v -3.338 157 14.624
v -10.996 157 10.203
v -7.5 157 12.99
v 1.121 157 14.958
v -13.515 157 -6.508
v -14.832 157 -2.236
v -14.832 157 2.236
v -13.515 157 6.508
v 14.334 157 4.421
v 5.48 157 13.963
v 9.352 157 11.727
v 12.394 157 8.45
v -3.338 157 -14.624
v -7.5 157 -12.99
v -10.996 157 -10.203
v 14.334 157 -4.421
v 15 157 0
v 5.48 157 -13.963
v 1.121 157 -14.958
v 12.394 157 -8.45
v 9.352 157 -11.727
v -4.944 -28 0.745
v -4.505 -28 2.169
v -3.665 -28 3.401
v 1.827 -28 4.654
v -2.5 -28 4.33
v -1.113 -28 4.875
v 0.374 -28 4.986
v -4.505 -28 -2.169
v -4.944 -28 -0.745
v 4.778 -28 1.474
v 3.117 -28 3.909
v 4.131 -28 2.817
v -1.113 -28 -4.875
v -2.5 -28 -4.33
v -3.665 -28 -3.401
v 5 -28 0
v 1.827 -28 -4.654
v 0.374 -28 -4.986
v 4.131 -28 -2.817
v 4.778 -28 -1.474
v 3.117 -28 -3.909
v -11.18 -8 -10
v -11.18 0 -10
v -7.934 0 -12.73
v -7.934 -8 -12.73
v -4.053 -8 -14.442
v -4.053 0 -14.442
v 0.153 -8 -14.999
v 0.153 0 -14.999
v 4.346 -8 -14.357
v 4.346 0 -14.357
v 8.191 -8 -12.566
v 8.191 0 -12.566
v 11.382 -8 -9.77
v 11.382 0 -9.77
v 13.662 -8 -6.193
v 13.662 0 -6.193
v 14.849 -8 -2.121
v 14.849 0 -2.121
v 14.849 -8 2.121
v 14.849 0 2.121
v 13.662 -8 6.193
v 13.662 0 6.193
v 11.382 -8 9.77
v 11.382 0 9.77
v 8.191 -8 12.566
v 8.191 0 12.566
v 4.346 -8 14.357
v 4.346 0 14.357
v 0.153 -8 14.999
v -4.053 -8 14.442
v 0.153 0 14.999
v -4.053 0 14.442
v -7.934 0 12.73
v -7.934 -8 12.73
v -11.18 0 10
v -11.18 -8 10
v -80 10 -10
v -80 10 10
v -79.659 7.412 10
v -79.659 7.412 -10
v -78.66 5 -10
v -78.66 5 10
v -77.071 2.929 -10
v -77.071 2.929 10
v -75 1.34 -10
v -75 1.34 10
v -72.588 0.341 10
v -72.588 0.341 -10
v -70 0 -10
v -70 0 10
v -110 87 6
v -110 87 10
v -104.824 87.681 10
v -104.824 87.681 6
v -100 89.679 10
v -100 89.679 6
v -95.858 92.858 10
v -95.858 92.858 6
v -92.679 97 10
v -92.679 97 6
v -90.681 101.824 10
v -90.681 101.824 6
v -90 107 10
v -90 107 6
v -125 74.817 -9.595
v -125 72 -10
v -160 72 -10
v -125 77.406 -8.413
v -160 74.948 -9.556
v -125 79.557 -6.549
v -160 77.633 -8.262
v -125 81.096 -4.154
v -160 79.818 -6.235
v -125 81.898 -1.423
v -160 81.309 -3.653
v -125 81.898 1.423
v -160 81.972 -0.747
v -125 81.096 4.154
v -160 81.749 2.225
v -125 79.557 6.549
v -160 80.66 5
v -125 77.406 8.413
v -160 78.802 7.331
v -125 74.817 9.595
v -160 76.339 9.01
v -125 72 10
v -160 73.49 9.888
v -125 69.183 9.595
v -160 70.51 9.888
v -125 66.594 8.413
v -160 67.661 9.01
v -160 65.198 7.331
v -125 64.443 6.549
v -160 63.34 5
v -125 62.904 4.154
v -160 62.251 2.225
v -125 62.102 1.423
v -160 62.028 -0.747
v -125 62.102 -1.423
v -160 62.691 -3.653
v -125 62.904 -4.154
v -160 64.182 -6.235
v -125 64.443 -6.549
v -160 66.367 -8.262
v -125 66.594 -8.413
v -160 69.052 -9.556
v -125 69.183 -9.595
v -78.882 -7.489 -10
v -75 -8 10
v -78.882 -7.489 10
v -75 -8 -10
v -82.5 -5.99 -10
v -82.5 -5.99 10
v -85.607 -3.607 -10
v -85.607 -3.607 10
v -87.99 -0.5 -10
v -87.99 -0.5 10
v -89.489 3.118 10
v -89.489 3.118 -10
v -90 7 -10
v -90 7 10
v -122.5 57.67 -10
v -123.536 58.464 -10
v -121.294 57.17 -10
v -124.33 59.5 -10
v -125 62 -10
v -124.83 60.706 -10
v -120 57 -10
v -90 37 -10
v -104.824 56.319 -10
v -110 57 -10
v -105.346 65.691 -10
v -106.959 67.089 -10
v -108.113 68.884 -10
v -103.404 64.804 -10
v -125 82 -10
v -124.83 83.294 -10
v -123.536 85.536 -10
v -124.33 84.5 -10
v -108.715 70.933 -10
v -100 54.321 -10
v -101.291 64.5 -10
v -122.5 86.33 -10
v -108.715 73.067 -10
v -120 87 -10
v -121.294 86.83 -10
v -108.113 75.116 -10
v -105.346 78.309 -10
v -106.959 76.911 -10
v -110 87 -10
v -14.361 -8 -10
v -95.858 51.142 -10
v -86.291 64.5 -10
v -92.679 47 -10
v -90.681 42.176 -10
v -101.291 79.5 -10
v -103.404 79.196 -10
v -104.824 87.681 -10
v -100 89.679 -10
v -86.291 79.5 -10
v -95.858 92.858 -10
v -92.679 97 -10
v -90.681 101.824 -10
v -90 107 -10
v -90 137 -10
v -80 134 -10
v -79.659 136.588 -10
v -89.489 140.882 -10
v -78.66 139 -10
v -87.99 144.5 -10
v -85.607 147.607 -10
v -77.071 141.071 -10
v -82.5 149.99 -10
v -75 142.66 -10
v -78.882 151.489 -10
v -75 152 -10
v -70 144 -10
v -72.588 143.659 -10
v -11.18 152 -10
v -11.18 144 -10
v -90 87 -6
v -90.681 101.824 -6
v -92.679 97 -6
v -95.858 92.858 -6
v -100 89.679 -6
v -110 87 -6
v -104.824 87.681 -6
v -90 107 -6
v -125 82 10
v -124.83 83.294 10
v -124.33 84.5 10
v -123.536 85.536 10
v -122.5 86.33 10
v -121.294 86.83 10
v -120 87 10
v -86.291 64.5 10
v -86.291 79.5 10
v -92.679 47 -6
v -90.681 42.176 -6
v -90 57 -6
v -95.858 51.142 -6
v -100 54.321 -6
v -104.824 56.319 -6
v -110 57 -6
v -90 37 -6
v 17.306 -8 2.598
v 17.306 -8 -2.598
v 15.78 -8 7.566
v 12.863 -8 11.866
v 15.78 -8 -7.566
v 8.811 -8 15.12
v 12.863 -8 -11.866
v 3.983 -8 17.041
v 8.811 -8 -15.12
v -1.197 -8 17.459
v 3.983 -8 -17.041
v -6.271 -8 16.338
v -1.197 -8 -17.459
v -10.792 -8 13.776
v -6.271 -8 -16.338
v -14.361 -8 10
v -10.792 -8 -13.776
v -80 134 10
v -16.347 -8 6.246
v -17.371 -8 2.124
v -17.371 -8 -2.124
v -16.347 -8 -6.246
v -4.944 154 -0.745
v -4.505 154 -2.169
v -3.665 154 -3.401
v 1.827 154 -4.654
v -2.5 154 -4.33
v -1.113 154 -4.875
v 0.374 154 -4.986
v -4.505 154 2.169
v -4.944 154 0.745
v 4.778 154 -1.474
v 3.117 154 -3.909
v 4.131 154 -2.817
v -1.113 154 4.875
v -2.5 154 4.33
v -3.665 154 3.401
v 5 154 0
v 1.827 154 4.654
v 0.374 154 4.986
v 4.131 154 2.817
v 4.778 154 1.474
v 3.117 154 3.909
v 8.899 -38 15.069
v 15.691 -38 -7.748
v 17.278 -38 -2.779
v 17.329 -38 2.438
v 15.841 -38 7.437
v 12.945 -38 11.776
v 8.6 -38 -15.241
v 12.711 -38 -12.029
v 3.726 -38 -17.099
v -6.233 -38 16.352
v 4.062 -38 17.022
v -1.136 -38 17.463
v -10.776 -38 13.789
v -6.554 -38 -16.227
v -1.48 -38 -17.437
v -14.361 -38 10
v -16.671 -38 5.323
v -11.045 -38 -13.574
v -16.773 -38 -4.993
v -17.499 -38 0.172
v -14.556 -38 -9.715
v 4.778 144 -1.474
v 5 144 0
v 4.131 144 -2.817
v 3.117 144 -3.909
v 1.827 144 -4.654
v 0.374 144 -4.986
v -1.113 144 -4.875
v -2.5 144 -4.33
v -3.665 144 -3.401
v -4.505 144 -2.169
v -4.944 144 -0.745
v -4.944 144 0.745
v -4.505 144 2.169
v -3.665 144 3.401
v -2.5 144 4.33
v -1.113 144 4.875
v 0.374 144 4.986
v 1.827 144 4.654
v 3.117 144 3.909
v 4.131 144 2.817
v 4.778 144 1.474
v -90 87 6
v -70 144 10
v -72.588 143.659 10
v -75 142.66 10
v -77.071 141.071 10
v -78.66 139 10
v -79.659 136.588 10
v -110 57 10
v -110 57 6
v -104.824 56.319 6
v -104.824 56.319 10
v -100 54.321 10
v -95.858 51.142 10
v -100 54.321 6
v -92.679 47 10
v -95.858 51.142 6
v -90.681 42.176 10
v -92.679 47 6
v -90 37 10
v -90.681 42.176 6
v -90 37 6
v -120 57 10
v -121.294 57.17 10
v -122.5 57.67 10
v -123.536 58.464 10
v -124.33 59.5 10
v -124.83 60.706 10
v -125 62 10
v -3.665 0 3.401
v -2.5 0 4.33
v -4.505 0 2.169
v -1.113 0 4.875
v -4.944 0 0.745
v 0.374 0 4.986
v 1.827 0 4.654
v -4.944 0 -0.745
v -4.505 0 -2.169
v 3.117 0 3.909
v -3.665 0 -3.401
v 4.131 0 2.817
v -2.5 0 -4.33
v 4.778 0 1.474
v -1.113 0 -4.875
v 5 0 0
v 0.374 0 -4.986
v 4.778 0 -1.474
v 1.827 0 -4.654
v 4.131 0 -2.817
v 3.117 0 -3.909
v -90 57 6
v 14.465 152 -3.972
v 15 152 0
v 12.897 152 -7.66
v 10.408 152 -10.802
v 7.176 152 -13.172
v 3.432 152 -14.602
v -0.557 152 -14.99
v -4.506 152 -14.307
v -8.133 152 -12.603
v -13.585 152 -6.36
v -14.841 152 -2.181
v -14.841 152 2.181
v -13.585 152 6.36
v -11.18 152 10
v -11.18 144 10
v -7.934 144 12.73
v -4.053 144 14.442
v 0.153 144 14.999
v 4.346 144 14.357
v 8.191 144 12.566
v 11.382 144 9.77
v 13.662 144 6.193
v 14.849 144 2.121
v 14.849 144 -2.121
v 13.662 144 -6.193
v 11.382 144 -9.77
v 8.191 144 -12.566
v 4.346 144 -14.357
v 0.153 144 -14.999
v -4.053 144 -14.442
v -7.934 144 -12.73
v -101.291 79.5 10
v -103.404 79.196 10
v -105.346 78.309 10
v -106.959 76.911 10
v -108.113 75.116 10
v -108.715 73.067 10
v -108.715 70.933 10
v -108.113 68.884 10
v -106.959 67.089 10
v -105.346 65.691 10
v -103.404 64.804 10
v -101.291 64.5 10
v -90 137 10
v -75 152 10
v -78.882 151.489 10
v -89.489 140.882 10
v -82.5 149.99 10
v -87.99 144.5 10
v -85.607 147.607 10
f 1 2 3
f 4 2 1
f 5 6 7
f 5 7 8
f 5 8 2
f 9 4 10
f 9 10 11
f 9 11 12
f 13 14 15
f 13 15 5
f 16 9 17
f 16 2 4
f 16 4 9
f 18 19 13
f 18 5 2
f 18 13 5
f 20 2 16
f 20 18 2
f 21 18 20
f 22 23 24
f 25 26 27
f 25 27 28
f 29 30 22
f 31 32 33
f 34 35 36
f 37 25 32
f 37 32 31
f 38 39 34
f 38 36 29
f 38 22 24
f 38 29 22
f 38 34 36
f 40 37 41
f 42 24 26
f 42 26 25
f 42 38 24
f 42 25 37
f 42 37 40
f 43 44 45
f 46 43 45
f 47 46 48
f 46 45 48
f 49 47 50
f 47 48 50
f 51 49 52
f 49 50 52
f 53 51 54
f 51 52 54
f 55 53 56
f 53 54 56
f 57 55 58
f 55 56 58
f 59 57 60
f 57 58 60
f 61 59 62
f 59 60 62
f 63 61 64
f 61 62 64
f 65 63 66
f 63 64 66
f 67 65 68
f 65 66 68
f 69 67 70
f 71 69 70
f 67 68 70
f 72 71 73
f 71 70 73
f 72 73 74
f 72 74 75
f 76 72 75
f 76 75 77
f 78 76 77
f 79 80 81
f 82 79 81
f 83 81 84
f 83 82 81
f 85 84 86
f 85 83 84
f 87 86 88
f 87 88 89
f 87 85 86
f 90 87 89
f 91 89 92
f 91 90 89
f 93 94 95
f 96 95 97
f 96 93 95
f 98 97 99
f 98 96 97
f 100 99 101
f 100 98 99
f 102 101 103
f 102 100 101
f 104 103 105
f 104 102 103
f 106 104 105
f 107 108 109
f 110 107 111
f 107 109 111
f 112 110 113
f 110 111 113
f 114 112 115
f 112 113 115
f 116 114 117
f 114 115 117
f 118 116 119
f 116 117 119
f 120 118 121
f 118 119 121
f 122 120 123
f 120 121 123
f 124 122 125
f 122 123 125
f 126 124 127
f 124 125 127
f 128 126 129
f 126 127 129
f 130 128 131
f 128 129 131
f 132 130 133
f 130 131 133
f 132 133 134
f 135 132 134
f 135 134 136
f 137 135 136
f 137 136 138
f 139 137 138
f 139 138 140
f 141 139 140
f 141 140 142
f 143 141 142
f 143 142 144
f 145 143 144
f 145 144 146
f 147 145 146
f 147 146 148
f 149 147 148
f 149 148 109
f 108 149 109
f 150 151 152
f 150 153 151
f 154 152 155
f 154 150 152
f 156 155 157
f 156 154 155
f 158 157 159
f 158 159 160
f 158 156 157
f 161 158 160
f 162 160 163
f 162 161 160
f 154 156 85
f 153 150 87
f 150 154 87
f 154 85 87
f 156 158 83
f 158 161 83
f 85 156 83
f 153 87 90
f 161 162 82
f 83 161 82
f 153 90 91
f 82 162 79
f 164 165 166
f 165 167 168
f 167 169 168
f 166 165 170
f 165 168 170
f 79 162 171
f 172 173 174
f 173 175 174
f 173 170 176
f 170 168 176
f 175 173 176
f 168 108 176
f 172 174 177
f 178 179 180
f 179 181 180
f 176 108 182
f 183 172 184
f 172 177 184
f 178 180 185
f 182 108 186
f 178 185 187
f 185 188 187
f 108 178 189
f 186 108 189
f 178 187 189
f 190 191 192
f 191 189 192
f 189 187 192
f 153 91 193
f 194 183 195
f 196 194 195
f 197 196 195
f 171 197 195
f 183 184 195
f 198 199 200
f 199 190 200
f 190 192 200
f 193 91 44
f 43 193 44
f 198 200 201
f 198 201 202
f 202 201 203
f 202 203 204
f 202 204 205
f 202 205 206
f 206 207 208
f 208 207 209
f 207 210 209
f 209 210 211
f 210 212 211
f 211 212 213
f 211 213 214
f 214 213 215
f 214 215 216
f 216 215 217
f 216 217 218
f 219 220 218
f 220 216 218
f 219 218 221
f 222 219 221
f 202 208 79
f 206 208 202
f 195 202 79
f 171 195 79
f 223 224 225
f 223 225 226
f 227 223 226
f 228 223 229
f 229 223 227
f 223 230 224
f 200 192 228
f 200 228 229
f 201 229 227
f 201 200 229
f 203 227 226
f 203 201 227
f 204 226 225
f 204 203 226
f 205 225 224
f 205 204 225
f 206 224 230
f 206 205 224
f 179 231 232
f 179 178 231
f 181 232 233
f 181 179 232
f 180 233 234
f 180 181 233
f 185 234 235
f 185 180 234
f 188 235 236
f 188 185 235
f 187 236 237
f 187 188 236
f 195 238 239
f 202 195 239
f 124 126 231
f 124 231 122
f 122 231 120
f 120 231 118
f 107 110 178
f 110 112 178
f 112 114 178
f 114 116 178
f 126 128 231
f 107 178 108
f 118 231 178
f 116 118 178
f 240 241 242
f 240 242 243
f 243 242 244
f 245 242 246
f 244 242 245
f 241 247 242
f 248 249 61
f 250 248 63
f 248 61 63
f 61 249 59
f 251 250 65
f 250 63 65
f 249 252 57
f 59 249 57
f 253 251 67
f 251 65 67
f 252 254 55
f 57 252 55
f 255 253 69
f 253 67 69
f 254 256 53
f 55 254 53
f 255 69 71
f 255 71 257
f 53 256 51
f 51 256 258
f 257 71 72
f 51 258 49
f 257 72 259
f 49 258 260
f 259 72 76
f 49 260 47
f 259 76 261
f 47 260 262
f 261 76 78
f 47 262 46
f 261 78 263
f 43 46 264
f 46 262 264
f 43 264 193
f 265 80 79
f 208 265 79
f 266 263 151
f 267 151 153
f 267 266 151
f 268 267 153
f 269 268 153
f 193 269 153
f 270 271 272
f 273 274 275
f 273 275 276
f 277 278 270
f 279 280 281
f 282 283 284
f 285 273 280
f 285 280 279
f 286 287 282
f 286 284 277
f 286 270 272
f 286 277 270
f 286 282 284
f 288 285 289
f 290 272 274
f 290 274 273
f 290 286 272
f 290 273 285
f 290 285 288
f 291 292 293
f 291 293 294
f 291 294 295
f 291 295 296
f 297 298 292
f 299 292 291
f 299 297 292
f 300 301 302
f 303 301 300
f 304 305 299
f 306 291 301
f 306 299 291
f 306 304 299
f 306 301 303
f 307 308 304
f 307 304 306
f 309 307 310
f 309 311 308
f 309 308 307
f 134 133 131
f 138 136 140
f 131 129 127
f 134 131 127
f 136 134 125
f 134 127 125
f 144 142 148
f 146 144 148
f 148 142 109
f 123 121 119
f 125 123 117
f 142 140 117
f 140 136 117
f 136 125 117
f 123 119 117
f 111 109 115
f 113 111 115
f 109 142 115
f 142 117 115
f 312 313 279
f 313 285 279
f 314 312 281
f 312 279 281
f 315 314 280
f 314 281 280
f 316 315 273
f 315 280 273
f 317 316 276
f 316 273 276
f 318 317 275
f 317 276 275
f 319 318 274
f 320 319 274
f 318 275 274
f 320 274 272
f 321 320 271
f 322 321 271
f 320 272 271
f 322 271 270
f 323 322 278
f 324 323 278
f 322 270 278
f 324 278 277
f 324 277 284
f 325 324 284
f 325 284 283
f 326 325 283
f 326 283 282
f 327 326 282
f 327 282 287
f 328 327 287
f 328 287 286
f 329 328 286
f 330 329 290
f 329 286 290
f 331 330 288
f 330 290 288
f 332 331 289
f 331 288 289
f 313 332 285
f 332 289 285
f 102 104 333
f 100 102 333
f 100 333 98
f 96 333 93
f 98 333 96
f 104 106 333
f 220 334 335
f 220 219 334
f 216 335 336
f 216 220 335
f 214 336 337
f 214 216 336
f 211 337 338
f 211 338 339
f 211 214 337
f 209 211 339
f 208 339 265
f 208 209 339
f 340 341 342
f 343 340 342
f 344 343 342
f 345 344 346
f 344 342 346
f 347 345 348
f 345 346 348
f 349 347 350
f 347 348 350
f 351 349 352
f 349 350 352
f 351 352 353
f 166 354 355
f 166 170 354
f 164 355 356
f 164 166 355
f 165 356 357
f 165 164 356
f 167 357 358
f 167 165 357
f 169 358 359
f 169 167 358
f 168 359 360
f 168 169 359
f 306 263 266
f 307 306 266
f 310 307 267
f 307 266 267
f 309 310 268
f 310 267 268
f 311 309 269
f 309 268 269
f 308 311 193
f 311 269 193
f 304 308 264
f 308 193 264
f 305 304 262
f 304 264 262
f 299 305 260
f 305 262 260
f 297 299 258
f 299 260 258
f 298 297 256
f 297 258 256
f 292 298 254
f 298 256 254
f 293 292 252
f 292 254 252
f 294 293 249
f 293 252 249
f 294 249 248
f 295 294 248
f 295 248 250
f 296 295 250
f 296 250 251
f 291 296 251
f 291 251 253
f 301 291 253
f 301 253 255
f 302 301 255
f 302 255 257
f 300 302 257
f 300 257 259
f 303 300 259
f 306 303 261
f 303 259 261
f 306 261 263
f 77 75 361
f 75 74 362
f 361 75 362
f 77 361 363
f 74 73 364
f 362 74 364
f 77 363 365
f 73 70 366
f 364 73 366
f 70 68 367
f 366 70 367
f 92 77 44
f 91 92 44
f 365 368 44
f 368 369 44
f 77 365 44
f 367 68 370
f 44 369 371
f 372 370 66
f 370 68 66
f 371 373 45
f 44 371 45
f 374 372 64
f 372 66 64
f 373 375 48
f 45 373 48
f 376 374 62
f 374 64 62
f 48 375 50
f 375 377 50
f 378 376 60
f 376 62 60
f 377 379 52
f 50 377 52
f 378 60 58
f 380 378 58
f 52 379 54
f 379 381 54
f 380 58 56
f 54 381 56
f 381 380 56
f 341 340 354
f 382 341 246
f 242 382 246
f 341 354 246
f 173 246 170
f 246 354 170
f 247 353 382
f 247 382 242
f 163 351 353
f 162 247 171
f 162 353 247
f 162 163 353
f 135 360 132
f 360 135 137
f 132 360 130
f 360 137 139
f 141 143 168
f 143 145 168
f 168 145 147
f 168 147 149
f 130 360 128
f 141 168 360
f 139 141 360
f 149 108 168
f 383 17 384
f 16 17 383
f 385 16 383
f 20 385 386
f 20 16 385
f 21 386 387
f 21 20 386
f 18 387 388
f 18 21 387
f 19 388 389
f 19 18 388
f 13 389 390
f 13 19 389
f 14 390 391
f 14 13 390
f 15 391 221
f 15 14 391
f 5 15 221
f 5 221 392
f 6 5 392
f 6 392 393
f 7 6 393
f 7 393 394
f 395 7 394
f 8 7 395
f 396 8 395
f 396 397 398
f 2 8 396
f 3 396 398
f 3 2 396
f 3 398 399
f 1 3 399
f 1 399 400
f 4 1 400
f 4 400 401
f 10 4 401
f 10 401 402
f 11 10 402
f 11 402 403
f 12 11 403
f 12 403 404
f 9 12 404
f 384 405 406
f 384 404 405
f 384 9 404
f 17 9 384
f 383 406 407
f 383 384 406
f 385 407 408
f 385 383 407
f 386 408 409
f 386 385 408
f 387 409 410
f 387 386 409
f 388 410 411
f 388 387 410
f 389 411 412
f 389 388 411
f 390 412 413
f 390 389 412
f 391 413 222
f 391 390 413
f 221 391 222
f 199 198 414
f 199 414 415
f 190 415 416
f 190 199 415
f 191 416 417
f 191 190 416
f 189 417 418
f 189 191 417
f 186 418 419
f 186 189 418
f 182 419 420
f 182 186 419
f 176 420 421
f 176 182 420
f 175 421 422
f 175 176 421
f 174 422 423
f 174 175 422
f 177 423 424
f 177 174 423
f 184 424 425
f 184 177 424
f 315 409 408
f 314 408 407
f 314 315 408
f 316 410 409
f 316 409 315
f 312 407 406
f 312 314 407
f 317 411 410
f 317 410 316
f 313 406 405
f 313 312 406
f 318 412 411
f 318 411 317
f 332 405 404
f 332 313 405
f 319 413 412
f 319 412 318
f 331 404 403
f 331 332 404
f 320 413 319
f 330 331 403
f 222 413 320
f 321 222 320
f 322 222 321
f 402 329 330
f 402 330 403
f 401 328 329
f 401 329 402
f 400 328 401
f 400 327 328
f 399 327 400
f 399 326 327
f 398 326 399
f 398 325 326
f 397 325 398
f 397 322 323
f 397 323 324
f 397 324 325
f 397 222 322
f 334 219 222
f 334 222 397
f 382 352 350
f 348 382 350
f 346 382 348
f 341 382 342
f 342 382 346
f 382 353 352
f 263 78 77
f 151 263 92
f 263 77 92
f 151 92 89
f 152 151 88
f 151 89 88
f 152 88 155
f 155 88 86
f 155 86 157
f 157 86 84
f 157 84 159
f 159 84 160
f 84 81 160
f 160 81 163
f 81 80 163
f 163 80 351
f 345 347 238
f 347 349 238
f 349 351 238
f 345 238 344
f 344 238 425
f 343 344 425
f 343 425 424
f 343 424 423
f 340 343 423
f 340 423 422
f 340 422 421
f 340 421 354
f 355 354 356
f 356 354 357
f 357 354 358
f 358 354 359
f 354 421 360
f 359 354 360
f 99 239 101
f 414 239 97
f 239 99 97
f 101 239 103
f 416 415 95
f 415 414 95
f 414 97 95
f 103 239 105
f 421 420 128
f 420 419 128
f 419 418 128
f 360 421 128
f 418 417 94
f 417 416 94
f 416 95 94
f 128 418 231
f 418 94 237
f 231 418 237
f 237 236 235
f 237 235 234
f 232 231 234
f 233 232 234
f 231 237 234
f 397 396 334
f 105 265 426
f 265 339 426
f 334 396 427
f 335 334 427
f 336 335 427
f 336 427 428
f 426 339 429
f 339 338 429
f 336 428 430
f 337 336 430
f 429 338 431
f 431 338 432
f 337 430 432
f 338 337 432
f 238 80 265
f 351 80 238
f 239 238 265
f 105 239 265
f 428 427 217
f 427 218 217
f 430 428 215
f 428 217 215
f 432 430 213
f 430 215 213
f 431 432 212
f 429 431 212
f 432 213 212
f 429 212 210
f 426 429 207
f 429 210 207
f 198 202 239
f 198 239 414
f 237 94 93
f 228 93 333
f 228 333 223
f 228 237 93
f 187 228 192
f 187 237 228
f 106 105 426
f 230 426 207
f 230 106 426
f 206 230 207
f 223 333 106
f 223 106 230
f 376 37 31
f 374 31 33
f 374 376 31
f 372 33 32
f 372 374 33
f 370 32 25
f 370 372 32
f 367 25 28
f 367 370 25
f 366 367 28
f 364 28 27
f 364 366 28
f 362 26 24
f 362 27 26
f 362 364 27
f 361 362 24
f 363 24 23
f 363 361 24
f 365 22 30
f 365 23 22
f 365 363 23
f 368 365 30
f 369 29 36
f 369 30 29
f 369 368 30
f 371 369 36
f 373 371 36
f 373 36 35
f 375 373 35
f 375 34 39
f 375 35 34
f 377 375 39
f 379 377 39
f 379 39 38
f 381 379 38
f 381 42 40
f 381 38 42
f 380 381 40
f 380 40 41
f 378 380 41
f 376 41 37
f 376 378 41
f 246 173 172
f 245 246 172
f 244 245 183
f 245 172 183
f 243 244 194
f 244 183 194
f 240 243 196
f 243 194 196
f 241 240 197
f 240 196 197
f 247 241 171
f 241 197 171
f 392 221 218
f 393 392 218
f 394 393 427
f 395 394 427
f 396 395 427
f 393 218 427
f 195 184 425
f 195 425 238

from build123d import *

# Parameters (mm, degrees)
SKETCH1_R                = 10
BOSS_EXTRUDE1_DEPTH      = 35
SKETCH2_W                = 20
SKETCH2_H                = 30
BOSS_EXTRUDE2_DEPTH      = 35
BOSS_EXTRUDE3_DEPTH      = 80
BOSS_EXTRUDE3_DEPTH_BACK = 80
SKETCH3_W                = 20
SKETCH3_H                = 10
SKETCH4_W                = 20
SKETCH4_H                = 8
BOSS_EXTRUDE4_DEPTH      = 65
SKETCH5_R                = 5
BOSS_EXTRUDE6_DEPTH      = 8
BOSS_EXTRUDE7_START      = -8
SKETCH6_R                = 5
BOSS_EXTRUDE7_DEPTH      = 8
FILLET1_R                = 15
FILLET2_R                = 10
FILLET3_R                = 10
FILLET4_R                = 15
FILLET5_R                = 20
FILLET6_R                = 20
SKETCH7_W                = 12
SKETCH7_H                = 20
CUT_EXTRUDE1_DEPTH       = 30
SKETCH8_R                = 17.5
BOSS_EXTRUDE8_DEPTH      = 30
SKETCH9_R                = 5
CUT_EXTRUDE2_DEPTH       = 20
BOSS_EXTRUDE9_START      = 5
SKETCH10_R               = 15
BOSS_EXTRUDE9_DEPTH      = 5
CUT_EXTRUDE4_START       = -2
SKETCH11_R               = 5
CUT_EXTRUDE4_DEPTH       = 2
CUT_EXTRUDE5_DEPTH       = 211.624072698
FILLET9_R                = 5
BODY_MOVE_COPY1_ANGLE    = 90


with BuildPart() as part:
    # Sketch1 → Boss-Extrude1 (new body)
    with BuildSketch(Plane.XY):
        Circle(SKETCH1_R)
    extrude(amount=BOSS_EXTRUDE1_DEPTH)

    # Sketch2 → Boss-Extrude2 (add)
    with BuildSketch(Plane.XY.offset(35)):
        Rectangle(SKETCH2_W, SKETCH2_H)
    extrude(amount=BOSS_EXTRUDE2_DEPTH)

    # Sketch3 → Boss-Extrude3 (add, two sides: drawn at the far end of the back side and taken through both)
    with BuildSketch(Plane(origin=(0, 0, 0), x_dir=(1, 0, 0), z_dir=(0, 1, 0)).offset(-BOSS_EXTRUDE3_DEPTH_BACK)):
        with Locations((0, -75)):
            Rectangle(SKETCH3_W, SKETCH3_H)
    extrude(amount=BOSS_EXTRUDE3_DEPTH + BOSS_EXTRUDE3_DEPTH_BACK)

    # Sketch4 → Boss-Extrude4 (add)
    with BuildSketch(Plane.XY.offset(80)):
        with Locations((0, 76)):
            Rectangle(SKETCH4_W, SKETCH4_H)
        with Locations((0, -76)):
            Rectangle(SKETCH4_W, SKETCH4_H)
    extrude(amount=BOSS_EXTRUDE4_DEPTH)

    # Sketch5 → Boss-Extrude6 (add)
    with BuildSketch(Plane(origin=(0, 80, 0), x_dir=(1, 0, 0), z_dir=(0, 1, 0))):
        with BuildLine():
            Line((10, -145), (10, -148.819660113))
            ThreePointArc((10, -148.819660113), (0, -175), (-10, -148.819660113))
            Line((-10, -148.819660113), (-10, -145))
            Line((-10, -145), (10, -145))
        make_face()
        with Locations(Location((0, -160, 0), (0, 0, 270))):
            Circle(SKETCH5_R, mode=Mode.SUBTRACT)
    extrude(amount=-BOSS_EXTRUDE6_DEPTH)

    # Sketch6 → Boss-Extrude7 (add)
    with BuildSketch(Plane.XZ.offset(80).offset(BOSS_EXTRUDE7_START)):
        with BuildLine():
            Line((-10, 148.819660113), (-10, 145))
            Line((-10, 145), (10, 145))
            Line((10, 145), (10, 148.819660113))
            ThreePointArc((10, 148.819660113), (0, 175), (-10, 148.819660113))
        make_face()
        with Locations(Location((0, 160, 0), (0, 0, 90))):
            Circle(SKETCH6_R, mode=Mode.SUBTRACT)
    extrude(amount=BOSS_EXTRUDE7_DEPTH)

    # Fillet1
    fillet1_edges = [part.edges().sort_by_distance(p)[0] for p in [
        (0, 80, 70),
    ]]
    fillet(fillet1_edges, radius=FILLET1_R)

    # Fillet2
    fillet2_edges = [part.edges().sort_by_distance(p)[0] for p in [
        (0, 72, 80),
    ]]
    fillet(fillet2_edges, radius=FILLET2_R)

    # Fillet3
    fillet3_edges = [part.edges().sort_by_distance(p)[0] for p in [
        (0, -72, 80),
    ]]
    fillet(fillet3_edges, radius=FILLET3_R)

    # Fillet4
    fillet4_edges = [part.edges().sort_by_distance(p)[0] for p in [
        (0, -80, 70),
    ]]
    fillet(fillet4_edges, radius=FILLET4_R)

    # Fillet5
    fillet5_edges = [part.edges().sort_by_distance(p)[0] for p in [
        (0, 15, 70),
    ]]
    fillet(fillet5_edges, radius=FILLET5_R)

    # Fillet6
    fillet6_edges = [part.edges().sort_by_distance(p)[0] for p in [
        (0, -15, 70),
    ]]
    fillet(fillet6_edges, radius=FILLET6_R)

    # Sketch7 → Cut-Extrude1 (cut)
    with BuildSketch(Plane(origin=(0, 15, 0), x_dir=(1, 0, 0), z_dir=(0, 1, 0))):
        with Locations((0, -60)):
            Rectangle(SKETCH7_W, SKETCH7_H)
    cut_extrude1 = extrude(amount=CUT_EXTRUDE1_DEPTH, mode=Mode.SUBTRACT)

    # Mirror1: Cut-Extrude1 across plane
    add(cut_extrude1.mirror(Plane.ZX), mode=Mode.SUBTRACT)

    # Sketch8 → Boss-Extrude8 (add)
    with BuildSketch(Plane.XZ.offset(80)):
        with Locations(Location((0, 160, 0), (0, 0, 235.150095421))):
            Circle(SKETCH8_R)
    extrude(amount=BOSS_EXTRUDE8_DEPTH)

    # Sketch9 → Cut-Extrude2 (cut)
    with BuildSketch(Plane(origin=(0, -80, 0), x_dir=(1, 0, 0), z_dir=(0, 1, 0))):
        with Locations(Location((0, -160, 0), (0, 0, 270))):
            Circle(SKETCH9_R)
    extrude(amount=-CUT_EXTRUDE2_DEPTH, mode=Mode.SUBTRACT)

    # Sketch10 → Boss-Extrude9 (add)
    with BuildSketch(Plane(origin=(0, 80, 0), x_dir=(1, 0, 0), z_dir=(0, 1, 0)).offset(BOSS_EXTRUDE9_START)):
        with Locations(Location((0, -160, 0), (0, 0, 270))):
            Circle(SKETCH10_R)
    extrude(amount=-BOSS_EXTRUDE9_DEPTH)

    # Sketch11 → Cut-Extrude4 (cut)
    with BuildSketch(Plane.XZ.offset(-80).offset(CUT_EXTRUDE4_START)):
        with Locations(Location((0, 160, 0), (0, 0, 90))):
            Circle(SKETCH11_R)
    extrude(amount=CUT_EXTRUDE4_DEPTH, mode=Mode.SUBTRACT)

    # Sketch12 → Cut-Extrude5 (cut, through all)
    with BuildSketch(Plane(origin=(10, 0, 0), x_dir=(0, 0, -1), z_dir=(1, 0, 0))):
        with BuildLine():
            Line((-73.708886101, 7.5), (-58.708886101, 7.5))
            ThreePointArc((-58.708886101, 7.5), (-51.208886101, 0), (-58.708886101, -7.5))
            Line((-58.708886101, -7.5), (-73.708886101, -7.5))
            Line((-73.708886101, -7.5), (-73.708886101, 7.5))
        make_face()
    extrude(amount=-CUT_EXTRUDE5_DEPTH, mode=Mode.SUBTRACT)

    # Fillet9
    fillet9_edges = [part.edges().sort_by_distance(p)[0] for p in [
        (0, 15, 35),
        (0, -15, 35),
    ]]
    fillet(fillet9_edges, radius=FILLET9_R - 0.0001)  # a hair under: the kernel refuses the full size


with BuildPart() as part_1:
    # Body-Move/Copy1: read off the stored shape, not the designer's step
    # Body-Move/Copy1: moved
    add(part.part.moved(Location((0, 72, -160))).rotate(Axis((0, 0, 0), (0, 1, 0)), BODY_MOVE_COPY1_ANGLE))


solid = part_1.part
